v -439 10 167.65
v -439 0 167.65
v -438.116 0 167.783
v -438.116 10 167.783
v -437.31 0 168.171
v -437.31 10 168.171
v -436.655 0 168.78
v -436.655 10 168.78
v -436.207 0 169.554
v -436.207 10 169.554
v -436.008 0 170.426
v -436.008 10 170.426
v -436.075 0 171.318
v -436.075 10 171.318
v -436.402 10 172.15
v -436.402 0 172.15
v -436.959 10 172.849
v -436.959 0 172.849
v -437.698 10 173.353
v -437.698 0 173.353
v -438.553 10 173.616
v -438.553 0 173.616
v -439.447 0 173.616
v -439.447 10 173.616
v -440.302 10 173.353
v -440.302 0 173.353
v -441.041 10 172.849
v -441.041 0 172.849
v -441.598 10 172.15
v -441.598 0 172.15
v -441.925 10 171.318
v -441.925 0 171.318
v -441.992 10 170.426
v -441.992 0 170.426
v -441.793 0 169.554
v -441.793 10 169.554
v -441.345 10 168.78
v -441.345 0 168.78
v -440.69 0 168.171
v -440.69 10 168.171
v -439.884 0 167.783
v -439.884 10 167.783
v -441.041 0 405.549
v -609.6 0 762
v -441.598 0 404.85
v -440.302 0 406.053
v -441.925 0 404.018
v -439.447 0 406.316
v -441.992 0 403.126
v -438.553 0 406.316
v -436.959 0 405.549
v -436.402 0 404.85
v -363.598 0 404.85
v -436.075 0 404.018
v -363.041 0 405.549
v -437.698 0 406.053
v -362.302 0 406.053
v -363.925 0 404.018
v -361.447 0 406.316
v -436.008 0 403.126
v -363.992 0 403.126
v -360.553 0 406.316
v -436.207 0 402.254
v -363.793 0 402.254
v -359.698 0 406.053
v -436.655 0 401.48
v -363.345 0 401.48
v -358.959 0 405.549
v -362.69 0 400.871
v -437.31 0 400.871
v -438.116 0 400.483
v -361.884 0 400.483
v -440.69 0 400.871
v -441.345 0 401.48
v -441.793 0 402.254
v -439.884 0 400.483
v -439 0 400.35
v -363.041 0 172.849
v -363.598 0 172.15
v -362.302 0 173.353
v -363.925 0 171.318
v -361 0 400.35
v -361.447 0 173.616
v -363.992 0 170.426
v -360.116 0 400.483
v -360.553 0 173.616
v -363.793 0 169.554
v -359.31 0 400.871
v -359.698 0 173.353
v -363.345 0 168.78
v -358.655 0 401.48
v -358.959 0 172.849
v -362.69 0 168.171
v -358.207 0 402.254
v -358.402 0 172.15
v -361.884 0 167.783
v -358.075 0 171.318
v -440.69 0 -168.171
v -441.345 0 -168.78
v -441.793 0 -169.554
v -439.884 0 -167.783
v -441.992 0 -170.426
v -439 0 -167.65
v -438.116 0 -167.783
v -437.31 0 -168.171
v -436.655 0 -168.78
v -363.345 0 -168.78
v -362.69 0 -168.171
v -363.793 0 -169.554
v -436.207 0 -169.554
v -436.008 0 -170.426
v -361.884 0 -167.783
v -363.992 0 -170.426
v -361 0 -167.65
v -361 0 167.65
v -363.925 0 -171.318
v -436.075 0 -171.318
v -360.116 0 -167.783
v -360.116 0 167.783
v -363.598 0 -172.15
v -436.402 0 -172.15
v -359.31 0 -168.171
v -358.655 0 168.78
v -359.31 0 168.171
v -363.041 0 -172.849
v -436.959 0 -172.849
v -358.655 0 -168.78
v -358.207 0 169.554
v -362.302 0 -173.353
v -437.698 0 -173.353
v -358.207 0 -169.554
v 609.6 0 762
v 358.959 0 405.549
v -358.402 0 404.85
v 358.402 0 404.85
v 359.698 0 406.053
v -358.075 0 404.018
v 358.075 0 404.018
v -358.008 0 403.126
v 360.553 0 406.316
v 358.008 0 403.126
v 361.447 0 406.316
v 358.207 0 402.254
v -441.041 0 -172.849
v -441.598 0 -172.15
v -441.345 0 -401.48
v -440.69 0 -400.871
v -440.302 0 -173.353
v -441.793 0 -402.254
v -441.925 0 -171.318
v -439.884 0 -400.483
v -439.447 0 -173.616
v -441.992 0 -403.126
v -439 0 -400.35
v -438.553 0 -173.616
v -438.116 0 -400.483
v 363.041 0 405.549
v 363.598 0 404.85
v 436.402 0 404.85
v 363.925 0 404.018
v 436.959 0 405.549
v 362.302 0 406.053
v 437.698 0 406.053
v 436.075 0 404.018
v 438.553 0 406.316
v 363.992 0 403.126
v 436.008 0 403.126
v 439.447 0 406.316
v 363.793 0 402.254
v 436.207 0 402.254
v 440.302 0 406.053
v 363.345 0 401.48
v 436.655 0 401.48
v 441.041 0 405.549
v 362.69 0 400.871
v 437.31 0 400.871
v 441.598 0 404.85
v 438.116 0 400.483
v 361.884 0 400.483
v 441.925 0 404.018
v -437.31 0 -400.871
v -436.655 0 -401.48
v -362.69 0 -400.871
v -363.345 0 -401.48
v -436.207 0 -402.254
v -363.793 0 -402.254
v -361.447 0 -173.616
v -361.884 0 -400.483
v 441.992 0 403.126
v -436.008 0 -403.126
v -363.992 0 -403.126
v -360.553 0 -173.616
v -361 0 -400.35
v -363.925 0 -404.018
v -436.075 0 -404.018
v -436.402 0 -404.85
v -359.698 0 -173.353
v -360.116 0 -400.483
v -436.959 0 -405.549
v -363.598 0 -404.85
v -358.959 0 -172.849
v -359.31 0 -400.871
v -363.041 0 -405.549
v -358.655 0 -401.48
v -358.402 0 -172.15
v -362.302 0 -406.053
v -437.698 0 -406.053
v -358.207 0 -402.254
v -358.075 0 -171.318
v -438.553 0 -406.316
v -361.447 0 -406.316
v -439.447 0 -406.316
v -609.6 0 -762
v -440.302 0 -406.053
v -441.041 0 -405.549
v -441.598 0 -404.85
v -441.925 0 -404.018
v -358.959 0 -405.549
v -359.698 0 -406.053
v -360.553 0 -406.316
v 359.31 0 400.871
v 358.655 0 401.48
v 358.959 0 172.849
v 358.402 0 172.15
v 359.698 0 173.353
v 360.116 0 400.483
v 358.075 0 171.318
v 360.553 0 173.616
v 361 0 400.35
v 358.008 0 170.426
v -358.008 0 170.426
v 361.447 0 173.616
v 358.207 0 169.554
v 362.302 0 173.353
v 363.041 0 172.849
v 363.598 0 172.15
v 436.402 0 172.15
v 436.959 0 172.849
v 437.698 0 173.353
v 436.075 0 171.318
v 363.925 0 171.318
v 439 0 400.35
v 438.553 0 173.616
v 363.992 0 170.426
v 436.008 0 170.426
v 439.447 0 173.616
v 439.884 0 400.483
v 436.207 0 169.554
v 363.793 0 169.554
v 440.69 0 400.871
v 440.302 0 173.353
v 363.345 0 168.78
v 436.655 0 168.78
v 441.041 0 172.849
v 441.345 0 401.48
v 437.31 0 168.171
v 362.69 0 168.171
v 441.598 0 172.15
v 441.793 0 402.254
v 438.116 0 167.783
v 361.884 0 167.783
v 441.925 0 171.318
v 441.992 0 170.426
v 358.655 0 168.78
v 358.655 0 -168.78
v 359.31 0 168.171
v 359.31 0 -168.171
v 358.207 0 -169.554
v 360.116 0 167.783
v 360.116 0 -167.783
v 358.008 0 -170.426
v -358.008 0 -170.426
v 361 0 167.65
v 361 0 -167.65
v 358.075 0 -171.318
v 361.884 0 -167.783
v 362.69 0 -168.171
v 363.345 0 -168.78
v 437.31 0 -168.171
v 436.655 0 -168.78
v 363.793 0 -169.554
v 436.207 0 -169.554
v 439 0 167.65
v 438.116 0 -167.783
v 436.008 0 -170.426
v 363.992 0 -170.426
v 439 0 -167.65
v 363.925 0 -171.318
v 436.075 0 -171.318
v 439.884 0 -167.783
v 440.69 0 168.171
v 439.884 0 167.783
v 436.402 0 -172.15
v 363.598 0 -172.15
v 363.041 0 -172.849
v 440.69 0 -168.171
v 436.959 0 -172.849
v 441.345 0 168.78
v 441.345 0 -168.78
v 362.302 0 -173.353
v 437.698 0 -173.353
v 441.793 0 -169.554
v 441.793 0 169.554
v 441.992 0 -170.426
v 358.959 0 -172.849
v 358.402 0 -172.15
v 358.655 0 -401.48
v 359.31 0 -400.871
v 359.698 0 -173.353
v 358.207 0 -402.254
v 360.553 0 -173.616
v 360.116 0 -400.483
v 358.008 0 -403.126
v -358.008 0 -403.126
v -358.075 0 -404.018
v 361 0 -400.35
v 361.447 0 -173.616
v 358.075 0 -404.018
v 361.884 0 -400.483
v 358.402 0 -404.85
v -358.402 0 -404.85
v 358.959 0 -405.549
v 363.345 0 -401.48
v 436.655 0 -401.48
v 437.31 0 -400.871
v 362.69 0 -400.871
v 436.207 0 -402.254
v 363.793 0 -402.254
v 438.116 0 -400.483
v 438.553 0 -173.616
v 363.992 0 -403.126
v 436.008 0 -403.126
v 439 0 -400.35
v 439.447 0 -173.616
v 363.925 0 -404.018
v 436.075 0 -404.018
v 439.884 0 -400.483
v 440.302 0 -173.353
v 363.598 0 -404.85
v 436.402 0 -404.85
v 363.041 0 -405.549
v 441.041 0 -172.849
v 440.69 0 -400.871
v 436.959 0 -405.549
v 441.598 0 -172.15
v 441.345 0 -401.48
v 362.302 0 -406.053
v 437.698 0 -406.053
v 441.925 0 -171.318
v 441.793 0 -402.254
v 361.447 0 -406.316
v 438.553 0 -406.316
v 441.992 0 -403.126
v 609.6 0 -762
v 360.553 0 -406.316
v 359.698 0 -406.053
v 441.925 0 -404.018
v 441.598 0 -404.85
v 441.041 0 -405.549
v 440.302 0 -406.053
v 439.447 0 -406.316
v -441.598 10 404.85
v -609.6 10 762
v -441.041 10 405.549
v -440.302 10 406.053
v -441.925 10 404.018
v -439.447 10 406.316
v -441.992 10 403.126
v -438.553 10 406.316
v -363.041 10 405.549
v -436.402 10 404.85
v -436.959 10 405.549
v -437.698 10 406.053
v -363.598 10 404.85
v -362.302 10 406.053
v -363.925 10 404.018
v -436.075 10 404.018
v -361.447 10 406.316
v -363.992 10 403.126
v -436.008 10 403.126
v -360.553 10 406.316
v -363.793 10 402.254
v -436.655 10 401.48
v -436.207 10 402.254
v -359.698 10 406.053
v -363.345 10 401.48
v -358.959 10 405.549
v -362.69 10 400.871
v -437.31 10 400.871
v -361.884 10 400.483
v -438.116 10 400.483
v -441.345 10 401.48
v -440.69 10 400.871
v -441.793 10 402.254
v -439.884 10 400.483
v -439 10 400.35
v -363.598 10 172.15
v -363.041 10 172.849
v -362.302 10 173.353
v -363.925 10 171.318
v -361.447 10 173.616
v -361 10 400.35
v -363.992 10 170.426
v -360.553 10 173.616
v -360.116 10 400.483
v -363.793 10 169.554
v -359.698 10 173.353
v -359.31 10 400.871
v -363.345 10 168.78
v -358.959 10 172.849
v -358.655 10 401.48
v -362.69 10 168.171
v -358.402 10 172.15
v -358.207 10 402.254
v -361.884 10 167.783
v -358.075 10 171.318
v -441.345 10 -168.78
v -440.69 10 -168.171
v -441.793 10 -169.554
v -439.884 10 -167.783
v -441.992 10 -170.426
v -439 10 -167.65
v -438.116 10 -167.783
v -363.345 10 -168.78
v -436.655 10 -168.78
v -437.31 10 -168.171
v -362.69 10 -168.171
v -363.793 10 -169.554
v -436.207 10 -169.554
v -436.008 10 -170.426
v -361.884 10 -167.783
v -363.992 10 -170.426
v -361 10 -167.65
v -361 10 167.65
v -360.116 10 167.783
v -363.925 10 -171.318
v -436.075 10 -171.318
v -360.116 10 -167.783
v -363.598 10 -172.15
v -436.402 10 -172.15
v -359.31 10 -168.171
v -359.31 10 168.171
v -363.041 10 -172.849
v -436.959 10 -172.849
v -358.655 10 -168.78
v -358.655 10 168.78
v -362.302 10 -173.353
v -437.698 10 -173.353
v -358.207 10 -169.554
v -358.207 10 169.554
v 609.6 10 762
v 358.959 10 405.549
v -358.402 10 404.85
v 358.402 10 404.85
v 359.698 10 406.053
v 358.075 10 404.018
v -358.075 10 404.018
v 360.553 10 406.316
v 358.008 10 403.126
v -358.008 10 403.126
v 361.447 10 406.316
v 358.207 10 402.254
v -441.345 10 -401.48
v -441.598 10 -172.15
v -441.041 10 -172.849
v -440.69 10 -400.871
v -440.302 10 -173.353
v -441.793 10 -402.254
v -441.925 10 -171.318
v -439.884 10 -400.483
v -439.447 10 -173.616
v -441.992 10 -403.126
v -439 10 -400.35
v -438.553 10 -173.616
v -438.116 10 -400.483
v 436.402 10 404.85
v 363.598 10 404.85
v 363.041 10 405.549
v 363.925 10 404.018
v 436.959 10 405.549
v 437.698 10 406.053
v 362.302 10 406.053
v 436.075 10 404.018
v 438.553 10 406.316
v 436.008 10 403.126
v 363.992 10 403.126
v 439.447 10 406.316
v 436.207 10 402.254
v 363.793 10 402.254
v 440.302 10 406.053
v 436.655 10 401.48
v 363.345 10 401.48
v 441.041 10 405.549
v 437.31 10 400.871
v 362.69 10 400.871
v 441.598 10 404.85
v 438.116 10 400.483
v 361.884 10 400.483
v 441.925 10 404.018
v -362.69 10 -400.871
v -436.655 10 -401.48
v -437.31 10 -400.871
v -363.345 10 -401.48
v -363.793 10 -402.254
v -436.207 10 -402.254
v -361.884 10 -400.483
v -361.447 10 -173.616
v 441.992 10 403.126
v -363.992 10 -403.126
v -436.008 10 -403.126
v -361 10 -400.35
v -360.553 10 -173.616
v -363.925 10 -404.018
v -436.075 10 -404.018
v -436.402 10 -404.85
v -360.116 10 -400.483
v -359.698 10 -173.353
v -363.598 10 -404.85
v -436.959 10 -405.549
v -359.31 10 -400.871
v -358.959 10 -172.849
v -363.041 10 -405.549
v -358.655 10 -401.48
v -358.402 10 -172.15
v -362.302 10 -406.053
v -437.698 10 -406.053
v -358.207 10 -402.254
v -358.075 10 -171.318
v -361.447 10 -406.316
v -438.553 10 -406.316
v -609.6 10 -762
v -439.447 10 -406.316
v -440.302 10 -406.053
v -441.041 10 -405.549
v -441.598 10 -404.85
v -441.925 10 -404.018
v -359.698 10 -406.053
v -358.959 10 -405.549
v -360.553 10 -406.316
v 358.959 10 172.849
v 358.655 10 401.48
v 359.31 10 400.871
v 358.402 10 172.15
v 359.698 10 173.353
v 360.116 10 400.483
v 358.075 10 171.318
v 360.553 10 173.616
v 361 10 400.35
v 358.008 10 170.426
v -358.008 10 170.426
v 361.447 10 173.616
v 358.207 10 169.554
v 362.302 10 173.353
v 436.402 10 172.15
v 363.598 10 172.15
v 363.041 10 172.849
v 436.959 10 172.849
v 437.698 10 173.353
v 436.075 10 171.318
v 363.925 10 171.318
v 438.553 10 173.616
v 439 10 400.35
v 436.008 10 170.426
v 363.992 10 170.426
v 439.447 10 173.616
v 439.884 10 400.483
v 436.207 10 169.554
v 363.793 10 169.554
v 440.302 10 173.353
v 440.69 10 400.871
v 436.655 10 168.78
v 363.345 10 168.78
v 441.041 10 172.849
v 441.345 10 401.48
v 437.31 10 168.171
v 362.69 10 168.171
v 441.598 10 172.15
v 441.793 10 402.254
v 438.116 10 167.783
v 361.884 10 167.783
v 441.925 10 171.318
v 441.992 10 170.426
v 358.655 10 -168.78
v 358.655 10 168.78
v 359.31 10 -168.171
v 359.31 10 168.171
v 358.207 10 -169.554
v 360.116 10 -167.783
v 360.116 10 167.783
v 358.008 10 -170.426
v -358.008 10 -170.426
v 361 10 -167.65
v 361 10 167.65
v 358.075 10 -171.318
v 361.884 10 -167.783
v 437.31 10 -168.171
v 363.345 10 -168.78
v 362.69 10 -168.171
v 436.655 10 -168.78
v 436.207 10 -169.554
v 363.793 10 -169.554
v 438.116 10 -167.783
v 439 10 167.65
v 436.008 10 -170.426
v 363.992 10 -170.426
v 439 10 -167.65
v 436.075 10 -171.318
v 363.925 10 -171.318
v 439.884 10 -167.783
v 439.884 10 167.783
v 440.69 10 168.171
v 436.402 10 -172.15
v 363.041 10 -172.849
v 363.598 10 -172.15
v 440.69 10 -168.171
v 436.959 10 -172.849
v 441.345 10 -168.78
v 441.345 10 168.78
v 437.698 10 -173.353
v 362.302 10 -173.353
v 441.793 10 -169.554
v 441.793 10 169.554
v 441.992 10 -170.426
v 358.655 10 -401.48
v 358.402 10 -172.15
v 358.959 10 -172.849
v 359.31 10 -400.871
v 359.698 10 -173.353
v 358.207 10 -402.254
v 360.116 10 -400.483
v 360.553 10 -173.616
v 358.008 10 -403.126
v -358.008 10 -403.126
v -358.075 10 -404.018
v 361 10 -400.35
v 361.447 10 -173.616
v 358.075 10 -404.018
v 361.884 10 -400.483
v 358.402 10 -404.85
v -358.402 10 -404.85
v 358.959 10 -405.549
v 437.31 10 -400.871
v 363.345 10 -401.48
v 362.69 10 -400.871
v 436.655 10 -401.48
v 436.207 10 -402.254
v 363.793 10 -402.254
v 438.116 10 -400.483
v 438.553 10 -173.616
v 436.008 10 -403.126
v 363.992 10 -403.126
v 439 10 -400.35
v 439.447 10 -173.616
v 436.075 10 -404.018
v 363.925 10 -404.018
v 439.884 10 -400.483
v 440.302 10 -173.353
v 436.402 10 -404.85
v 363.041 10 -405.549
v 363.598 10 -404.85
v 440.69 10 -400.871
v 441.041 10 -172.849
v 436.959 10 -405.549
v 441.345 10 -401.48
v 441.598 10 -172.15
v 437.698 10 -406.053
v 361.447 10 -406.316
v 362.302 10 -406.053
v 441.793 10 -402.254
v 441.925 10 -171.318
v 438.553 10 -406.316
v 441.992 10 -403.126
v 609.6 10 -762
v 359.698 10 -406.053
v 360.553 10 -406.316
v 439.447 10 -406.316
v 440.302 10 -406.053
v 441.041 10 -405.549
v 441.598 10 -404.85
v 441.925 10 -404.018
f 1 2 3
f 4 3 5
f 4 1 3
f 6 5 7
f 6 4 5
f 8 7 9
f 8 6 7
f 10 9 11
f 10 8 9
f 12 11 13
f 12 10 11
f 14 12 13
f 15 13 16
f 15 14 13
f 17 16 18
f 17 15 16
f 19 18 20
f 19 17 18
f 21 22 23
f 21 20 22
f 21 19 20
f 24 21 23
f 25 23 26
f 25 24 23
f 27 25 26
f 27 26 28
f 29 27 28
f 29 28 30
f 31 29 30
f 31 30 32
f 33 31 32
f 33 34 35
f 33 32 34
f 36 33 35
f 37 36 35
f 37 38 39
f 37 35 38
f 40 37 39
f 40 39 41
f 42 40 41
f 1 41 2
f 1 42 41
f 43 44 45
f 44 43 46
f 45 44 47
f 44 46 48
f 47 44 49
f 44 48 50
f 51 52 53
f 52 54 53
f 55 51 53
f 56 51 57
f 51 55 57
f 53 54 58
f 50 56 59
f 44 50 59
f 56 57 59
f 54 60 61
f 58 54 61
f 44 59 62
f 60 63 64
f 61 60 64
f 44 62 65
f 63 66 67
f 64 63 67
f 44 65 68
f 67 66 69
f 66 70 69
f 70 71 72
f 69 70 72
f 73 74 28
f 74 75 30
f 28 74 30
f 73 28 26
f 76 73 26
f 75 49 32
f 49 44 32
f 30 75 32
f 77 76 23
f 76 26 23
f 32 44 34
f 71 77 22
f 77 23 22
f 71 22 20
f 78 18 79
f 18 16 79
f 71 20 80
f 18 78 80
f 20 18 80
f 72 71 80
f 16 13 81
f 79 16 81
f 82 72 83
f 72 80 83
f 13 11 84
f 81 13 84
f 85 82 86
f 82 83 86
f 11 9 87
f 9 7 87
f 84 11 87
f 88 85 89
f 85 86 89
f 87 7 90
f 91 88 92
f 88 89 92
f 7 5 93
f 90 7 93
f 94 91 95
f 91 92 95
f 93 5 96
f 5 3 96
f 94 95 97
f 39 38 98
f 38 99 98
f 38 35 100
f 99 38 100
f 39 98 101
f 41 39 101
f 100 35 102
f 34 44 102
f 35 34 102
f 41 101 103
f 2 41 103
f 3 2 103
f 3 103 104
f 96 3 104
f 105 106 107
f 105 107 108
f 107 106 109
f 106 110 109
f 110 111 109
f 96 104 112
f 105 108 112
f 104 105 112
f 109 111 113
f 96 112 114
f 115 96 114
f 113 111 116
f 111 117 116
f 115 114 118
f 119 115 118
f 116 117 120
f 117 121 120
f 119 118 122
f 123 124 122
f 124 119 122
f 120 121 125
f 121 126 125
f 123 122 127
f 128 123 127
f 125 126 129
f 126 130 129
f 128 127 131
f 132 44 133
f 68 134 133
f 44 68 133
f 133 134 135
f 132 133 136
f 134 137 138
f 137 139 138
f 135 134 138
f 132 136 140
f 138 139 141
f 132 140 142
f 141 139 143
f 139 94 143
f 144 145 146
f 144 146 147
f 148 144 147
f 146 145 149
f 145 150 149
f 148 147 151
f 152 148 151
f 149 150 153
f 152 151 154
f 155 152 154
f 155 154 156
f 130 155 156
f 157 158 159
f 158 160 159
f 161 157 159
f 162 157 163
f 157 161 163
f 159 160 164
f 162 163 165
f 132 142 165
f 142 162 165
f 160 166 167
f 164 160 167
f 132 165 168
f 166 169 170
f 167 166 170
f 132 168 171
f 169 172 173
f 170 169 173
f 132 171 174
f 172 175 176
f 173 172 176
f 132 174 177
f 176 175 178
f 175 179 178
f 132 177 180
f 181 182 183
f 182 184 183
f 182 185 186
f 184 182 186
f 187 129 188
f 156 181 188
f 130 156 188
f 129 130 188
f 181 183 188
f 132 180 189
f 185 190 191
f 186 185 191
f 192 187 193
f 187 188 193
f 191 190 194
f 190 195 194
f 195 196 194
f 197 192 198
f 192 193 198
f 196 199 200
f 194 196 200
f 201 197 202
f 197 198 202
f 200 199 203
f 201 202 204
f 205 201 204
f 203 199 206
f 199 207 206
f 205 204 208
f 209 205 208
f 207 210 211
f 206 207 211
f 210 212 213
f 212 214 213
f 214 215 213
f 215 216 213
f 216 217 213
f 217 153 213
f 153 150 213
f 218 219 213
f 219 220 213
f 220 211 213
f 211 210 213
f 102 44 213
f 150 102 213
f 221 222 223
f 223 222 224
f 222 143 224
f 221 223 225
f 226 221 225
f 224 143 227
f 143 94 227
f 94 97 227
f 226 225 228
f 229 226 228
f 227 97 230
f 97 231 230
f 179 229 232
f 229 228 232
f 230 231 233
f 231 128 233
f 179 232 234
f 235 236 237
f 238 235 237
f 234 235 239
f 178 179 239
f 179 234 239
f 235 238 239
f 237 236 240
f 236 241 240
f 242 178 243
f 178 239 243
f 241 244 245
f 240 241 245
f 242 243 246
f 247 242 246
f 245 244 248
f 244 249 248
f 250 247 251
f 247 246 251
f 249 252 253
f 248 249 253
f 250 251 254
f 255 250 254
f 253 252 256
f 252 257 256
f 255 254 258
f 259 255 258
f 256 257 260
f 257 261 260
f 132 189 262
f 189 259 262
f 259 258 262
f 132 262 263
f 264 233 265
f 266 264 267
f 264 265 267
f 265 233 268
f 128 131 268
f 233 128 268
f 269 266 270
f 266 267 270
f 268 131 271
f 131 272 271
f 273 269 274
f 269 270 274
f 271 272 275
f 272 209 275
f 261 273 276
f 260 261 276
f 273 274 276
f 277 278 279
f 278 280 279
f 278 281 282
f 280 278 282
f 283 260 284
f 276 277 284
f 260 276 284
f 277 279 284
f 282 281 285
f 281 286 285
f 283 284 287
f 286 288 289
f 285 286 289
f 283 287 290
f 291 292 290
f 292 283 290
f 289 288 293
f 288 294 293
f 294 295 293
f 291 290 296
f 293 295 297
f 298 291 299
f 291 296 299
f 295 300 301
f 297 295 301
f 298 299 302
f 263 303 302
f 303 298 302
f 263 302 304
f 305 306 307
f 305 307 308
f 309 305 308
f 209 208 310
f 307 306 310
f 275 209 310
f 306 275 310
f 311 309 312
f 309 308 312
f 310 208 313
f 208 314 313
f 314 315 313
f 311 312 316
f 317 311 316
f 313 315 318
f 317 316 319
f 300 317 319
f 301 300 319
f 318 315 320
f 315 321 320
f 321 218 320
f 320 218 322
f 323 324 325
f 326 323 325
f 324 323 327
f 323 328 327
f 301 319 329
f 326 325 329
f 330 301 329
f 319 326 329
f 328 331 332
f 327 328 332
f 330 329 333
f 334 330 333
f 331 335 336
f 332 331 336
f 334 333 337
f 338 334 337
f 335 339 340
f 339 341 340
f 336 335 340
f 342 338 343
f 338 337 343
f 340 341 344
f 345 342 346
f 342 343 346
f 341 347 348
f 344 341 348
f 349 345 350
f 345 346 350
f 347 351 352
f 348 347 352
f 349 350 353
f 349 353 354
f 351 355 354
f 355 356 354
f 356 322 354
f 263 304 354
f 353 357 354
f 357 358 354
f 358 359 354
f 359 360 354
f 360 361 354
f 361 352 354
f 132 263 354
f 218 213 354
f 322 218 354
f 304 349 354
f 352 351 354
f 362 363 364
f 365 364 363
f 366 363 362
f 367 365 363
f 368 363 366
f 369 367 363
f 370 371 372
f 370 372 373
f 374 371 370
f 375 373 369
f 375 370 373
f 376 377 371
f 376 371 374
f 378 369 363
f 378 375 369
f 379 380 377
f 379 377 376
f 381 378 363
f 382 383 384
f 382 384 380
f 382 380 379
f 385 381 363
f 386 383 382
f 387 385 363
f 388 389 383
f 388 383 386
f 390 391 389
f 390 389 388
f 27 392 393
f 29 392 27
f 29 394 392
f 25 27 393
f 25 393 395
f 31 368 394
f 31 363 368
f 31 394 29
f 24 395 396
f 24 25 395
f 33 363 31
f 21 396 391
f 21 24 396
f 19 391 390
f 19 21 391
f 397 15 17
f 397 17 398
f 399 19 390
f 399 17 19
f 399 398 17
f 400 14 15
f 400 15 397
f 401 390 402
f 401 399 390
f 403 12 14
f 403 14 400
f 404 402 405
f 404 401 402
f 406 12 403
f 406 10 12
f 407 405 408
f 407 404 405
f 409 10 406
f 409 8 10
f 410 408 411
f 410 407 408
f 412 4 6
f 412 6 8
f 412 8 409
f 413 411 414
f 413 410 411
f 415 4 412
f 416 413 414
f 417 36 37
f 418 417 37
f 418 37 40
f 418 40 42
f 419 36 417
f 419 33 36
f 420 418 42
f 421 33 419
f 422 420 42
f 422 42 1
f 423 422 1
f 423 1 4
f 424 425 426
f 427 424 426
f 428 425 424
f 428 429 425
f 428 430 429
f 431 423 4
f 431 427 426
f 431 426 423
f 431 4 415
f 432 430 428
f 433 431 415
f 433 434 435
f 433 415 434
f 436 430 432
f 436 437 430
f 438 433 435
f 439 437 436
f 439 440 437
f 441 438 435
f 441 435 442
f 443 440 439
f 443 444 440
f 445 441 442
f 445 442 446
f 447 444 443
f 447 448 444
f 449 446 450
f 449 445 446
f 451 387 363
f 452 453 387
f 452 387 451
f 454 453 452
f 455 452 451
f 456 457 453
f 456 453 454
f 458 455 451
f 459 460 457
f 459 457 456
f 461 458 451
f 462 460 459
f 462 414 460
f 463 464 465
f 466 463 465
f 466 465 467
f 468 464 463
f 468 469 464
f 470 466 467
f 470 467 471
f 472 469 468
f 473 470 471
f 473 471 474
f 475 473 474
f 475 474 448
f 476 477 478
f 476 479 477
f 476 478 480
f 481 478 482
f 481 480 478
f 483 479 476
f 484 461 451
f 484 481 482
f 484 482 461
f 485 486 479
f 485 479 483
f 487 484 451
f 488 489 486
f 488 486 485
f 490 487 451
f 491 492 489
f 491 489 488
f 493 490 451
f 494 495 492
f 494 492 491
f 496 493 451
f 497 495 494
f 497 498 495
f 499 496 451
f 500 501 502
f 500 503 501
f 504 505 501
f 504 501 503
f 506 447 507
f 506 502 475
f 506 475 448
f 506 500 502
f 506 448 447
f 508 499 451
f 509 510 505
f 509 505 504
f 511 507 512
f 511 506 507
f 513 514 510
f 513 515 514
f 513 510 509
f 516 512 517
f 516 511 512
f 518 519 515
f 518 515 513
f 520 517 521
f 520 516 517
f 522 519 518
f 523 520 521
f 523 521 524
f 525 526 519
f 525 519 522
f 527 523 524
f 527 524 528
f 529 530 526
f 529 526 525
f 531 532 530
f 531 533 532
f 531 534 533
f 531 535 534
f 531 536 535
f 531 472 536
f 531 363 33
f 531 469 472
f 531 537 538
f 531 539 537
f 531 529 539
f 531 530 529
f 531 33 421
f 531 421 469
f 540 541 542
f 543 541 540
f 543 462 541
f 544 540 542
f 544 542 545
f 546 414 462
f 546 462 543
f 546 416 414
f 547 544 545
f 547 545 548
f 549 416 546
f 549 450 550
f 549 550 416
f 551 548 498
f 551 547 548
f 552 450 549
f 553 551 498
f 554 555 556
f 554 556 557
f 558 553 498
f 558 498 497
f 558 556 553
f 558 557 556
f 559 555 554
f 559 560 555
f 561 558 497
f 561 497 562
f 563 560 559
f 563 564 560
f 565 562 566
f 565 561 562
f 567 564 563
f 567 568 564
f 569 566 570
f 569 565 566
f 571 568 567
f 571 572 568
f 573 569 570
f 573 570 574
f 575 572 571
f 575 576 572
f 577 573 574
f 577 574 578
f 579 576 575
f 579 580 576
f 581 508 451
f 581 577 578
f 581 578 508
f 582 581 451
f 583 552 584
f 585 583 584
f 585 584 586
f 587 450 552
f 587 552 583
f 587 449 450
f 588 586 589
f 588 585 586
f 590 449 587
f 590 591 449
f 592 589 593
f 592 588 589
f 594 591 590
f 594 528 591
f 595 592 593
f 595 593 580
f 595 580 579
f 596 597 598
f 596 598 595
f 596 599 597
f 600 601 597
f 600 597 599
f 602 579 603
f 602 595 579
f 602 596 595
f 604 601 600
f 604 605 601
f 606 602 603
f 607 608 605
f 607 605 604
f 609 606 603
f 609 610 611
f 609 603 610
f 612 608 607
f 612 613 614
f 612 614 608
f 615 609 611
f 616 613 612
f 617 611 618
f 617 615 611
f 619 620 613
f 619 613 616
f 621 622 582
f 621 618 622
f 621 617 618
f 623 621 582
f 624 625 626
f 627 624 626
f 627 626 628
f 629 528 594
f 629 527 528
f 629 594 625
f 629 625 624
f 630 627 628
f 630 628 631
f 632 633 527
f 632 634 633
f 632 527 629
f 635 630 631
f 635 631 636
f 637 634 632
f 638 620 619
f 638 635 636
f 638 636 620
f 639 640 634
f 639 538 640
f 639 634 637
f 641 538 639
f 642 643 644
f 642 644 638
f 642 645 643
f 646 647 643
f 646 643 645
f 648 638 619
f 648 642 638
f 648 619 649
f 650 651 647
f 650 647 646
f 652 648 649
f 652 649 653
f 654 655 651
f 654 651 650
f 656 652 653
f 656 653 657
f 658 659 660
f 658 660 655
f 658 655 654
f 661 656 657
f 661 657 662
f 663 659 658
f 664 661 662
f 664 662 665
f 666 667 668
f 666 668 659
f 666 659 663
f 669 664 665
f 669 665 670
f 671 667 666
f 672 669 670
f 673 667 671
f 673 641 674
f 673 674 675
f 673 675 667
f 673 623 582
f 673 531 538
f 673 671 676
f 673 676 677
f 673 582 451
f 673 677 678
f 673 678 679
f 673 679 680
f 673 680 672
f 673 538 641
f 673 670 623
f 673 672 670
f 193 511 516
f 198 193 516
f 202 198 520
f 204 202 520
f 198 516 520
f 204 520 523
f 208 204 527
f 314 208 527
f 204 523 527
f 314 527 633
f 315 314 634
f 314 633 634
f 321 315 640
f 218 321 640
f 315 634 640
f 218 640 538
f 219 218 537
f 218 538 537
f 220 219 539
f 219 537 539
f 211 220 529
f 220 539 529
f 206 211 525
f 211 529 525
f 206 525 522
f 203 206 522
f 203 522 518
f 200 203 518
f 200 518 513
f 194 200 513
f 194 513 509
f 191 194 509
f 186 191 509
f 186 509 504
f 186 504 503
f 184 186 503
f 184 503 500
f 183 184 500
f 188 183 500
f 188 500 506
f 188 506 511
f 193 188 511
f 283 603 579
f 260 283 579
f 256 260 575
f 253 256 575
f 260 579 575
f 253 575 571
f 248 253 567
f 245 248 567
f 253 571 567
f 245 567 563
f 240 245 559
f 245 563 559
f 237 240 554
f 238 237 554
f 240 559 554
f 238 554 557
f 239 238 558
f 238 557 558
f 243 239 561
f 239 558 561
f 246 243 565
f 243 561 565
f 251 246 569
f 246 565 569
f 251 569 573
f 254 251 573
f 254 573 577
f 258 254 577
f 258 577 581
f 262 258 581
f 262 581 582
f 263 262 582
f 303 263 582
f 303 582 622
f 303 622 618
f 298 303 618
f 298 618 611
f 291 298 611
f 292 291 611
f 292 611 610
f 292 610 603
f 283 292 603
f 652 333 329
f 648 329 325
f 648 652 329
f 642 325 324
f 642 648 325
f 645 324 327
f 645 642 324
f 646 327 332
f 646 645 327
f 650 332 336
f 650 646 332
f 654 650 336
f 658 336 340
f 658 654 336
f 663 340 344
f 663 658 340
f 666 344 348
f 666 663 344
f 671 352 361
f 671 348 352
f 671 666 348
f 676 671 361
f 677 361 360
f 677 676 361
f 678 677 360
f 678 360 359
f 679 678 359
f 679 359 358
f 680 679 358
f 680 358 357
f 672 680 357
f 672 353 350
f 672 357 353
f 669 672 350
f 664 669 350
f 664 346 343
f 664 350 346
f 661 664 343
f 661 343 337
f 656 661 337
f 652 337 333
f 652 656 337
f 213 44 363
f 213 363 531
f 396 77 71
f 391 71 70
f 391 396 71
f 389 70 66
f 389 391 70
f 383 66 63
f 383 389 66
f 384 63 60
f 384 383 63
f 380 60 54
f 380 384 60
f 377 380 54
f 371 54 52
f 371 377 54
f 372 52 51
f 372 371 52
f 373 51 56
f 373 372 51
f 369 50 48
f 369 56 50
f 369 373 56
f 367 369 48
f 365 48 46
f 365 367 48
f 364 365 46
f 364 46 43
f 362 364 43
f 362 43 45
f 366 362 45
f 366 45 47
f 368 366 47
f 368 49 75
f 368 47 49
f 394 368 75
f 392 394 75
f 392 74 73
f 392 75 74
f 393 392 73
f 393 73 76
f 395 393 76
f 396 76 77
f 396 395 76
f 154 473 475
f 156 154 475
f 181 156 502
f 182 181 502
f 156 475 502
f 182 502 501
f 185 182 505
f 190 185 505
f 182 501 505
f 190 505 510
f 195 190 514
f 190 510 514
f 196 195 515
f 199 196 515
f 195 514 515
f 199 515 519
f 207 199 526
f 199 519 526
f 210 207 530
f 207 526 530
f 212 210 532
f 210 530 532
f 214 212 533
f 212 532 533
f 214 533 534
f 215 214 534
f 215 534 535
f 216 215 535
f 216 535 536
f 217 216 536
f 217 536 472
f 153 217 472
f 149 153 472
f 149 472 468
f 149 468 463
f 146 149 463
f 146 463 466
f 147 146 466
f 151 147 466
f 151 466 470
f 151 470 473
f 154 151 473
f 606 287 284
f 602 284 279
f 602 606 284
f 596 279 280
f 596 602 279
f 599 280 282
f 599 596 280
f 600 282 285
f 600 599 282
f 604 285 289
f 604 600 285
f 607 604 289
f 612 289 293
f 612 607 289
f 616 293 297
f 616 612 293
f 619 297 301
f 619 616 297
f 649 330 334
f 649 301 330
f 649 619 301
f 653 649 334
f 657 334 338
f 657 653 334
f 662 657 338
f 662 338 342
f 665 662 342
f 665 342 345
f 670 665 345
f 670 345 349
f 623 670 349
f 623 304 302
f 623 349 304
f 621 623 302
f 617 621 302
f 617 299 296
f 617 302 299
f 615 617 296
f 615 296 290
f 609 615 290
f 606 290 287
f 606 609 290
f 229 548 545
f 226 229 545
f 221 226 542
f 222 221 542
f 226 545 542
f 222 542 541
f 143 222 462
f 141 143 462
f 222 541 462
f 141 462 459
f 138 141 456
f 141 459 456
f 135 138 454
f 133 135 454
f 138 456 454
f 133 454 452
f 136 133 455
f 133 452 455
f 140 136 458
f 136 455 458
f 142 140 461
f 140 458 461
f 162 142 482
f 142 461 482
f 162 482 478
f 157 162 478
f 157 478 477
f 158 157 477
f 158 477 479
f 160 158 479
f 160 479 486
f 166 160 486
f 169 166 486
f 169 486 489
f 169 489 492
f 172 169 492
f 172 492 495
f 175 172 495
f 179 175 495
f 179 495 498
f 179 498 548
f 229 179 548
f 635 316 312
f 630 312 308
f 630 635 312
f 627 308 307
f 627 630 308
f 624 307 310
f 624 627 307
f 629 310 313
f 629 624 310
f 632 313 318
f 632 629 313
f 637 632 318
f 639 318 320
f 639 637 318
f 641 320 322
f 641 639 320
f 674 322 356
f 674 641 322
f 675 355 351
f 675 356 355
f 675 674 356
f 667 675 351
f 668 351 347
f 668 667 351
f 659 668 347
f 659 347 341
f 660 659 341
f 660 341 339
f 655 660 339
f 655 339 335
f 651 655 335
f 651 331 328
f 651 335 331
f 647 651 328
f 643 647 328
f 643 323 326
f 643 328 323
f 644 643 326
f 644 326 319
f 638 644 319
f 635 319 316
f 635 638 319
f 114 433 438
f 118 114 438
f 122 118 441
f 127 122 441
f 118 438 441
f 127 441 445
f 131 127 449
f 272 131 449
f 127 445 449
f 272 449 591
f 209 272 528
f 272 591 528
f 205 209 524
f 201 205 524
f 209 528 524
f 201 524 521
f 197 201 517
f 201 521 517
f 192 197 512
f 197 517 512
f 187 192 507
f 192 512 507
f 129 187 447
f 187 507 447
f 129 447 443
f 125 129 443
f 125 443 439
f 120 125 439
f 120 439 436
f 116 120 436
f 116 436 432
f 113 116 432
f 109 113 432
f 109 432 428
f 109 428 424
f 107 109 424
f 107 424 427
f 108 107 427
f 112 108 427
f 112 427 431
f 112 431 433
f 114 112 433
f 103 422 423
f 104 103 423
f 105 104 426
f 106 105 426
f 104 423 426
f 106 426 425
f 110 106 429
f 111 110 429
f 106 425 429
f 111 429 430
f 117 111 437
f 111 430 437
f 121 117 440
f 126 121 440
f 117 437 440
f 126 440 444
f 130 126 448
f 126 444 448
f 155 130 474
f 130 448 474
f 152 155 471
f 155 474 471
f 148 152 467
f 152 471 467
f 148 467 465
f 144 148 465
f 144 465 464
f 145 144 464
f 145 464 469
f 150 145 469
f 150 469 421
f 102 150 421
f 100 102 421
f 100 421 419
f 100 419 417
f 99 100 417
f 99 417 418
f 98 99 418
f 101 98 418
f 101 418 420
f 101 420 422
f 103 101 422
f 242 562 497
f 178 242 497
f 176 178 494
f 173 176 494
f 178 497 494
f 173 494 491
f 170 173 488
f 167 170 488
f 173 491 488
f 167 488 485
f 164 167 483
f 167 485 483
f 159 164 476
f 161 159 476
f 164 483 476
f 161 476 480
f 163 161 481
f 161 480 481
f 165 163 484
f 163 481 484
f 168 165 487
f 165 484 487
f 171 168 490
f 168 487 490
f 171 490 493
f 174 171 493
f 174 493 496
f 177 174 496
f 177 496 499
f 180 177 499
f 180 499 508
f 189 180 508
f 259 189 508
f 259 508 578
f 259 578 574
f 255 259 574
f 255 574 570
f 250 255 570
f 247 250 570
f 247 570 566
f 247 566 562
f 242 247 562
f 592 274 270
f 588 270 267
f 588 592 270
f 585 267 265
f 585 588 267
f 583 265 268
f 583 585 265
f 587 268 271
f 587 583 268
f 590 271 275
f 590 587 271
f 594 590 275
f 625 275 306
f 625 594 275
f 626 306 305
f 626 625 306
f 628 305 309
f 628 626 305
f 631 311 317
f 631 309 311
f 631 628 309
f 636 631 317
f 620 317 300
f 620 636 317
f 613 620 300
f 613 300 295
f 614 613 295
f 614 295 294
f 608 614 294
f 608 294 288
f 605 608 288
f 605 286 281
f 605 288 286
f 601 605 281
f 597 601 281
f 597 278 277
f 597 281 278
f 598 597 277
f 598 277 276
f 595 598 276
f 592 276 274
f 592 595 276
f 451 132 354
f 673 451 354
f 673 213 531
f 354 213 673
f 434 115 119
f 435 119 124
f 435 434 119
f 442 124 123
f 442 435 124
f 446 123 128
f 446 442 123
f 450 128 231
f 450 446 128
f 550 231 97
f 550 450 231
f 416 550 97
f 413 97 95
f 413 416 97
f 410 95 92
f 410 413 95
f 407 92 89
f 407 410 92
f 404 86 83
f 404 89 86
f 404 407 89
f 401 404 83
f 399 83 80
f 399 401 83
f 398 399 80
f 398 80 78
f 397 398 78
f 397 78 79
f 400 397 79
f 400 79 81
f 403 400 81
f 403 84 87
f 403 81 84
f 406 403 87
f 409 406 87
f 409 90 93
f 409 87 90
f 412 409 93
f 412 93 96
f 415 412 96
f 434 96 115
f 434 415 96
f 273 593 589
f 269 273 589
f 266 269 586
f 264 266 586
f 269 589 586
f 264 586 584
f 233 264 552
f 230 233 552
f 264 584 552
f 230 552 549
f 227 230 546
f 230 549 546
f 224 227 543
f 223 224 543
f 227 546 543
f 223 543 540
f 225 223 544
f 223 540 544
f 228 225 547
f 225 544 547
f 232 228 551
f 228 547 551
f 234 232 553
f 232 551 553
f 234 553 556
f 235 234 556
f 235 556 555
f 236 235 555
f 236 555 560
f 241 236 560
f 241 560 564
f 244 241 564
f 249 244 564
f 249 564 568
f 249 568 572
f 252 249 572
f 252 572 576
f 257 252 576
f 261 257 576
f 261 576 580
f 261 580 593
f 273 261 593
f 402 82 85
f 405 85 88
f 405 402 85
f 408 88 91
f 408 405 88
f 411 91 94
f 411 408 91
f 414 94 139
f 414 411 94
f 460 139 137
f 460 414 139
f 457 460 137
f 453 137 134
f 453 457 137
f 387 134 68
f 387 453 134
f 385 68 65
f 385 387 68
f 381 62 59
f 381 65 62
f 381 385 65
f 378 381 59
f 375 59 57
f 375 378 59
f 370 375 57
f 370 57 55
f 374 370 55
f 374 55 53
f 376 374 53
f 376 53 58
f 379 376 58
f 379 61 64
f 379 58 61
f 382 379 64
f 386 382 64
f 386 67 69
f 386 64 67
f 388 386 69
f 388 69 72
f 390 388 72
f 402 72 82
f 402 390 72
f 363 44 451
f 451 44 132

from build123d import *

# Parameters (mm, degrees)
SKETCH1_W                                  = 1219.2
SKETCH1_H                                  = 1524
BOSS_EXTRUDE1_DEPTH                        = 10
SKETCH2_R                                  = 3
CUT_EXTRUDE1_DEPTH                         = 976.887370551
MIRROR1_AT_THE_SECOND_PLANE_COPY_1_SKETC_R = 3
MIRROR1_AT_THE_SECOND_PLANE_COPY_1_DEPTH   = 976.887370551


with BuildPart() as part:
    # Sketch1 → Boss-Extrude1 (new body)
    with BuildSketch(Plane(origin=(0, 0, 0), x_dir=(1, 0, 0), z_dir=(0, 1, 0))):
        Rectangle(SKETCH1_W, SKETCH1_H)
    extrude(amount=BOSS_EXTRUDE1_DEPTH)

    # Sketch2 → Cut-Extrude1 (cut, through all)
    with BuildSketch(Plane(origin=(0, 10, 0), x_dir=(1, 0, 0), z_dir=(0, 1, 0))):
        with Locations(Location((-439, 403.35, 0), (0, 0, 270))):
            Circle(SKETCH2_R)
        with Locations(Location((-361, 403.35, 0), (0, 0, 270))):
            Circle(SKETCH2_R)
        with Locations(Location((-361, 170.65, 0), (0, 0, 270))):
            Circle(SKETCH2_R)
        with Locations(Location((-439, 170.65, 0), (0, 0, 270))):
            Circle(SKETCH2_R)
    cut_extrude1 = extrude(amount=-CUT_EXTRUDE1_DEPTH, mode=Mode.SUBTRACT)

    # Mirror1: Cut-Extrude1 across plane
    add(cut_extrude1.mirror(Plane(origin=(0, 0, 0), x_dir=(0, 0, 1), z_dir=(1, 0, 0))), mode=Mode.SUBTRACT)

    # Mirror1 at the second plane: Cut-Extrude1 across plane
    add(cut_extrude1.mirror(Plane.XY), mode=Mode.SUBTRACT)

    # Mirror1 at the second plane copy 1 sketc → Mirror1 at the second plane copy 1 (cut, through all)
    with BuildSketch(Plane(origin=(0, 10, 0), x_dir=(-1, 0, 0), z_dir=(0, 1, 0))):
        with Locations(Location((-439, 403.35, 0), (0, 0, 270))):
            Circle(MIRROR1_AT_THE_SECOND_PLANE_COPY_1_SKETC_R)
        with Locations(Location((-361, 403.35, 0), (0, 0, 270))):
            Circle(MIRROR1_AT_THE_SECOND_PLANE_COPY_1_SKETC_R)
        with Locations(Location((-361, 170.65, 0), (0, 0, 270))):
            Circle(MIRROR1_AT_THE_SECOND_PLANE_COPY_1_SKETC_R)
        with Locations(Location((-439, 170.65, 0), (0, 0, 270))):
            Circle(MIRROR1_AT_THE_SECOND_PLANE_COPY_1_SKETC_R)
    extrude(amount=-MIRROR1_AT_THE_SECOND_PLANE_COPY_1_DEPTH, mode=Mode.SUBTRACT)


solid = part.part
